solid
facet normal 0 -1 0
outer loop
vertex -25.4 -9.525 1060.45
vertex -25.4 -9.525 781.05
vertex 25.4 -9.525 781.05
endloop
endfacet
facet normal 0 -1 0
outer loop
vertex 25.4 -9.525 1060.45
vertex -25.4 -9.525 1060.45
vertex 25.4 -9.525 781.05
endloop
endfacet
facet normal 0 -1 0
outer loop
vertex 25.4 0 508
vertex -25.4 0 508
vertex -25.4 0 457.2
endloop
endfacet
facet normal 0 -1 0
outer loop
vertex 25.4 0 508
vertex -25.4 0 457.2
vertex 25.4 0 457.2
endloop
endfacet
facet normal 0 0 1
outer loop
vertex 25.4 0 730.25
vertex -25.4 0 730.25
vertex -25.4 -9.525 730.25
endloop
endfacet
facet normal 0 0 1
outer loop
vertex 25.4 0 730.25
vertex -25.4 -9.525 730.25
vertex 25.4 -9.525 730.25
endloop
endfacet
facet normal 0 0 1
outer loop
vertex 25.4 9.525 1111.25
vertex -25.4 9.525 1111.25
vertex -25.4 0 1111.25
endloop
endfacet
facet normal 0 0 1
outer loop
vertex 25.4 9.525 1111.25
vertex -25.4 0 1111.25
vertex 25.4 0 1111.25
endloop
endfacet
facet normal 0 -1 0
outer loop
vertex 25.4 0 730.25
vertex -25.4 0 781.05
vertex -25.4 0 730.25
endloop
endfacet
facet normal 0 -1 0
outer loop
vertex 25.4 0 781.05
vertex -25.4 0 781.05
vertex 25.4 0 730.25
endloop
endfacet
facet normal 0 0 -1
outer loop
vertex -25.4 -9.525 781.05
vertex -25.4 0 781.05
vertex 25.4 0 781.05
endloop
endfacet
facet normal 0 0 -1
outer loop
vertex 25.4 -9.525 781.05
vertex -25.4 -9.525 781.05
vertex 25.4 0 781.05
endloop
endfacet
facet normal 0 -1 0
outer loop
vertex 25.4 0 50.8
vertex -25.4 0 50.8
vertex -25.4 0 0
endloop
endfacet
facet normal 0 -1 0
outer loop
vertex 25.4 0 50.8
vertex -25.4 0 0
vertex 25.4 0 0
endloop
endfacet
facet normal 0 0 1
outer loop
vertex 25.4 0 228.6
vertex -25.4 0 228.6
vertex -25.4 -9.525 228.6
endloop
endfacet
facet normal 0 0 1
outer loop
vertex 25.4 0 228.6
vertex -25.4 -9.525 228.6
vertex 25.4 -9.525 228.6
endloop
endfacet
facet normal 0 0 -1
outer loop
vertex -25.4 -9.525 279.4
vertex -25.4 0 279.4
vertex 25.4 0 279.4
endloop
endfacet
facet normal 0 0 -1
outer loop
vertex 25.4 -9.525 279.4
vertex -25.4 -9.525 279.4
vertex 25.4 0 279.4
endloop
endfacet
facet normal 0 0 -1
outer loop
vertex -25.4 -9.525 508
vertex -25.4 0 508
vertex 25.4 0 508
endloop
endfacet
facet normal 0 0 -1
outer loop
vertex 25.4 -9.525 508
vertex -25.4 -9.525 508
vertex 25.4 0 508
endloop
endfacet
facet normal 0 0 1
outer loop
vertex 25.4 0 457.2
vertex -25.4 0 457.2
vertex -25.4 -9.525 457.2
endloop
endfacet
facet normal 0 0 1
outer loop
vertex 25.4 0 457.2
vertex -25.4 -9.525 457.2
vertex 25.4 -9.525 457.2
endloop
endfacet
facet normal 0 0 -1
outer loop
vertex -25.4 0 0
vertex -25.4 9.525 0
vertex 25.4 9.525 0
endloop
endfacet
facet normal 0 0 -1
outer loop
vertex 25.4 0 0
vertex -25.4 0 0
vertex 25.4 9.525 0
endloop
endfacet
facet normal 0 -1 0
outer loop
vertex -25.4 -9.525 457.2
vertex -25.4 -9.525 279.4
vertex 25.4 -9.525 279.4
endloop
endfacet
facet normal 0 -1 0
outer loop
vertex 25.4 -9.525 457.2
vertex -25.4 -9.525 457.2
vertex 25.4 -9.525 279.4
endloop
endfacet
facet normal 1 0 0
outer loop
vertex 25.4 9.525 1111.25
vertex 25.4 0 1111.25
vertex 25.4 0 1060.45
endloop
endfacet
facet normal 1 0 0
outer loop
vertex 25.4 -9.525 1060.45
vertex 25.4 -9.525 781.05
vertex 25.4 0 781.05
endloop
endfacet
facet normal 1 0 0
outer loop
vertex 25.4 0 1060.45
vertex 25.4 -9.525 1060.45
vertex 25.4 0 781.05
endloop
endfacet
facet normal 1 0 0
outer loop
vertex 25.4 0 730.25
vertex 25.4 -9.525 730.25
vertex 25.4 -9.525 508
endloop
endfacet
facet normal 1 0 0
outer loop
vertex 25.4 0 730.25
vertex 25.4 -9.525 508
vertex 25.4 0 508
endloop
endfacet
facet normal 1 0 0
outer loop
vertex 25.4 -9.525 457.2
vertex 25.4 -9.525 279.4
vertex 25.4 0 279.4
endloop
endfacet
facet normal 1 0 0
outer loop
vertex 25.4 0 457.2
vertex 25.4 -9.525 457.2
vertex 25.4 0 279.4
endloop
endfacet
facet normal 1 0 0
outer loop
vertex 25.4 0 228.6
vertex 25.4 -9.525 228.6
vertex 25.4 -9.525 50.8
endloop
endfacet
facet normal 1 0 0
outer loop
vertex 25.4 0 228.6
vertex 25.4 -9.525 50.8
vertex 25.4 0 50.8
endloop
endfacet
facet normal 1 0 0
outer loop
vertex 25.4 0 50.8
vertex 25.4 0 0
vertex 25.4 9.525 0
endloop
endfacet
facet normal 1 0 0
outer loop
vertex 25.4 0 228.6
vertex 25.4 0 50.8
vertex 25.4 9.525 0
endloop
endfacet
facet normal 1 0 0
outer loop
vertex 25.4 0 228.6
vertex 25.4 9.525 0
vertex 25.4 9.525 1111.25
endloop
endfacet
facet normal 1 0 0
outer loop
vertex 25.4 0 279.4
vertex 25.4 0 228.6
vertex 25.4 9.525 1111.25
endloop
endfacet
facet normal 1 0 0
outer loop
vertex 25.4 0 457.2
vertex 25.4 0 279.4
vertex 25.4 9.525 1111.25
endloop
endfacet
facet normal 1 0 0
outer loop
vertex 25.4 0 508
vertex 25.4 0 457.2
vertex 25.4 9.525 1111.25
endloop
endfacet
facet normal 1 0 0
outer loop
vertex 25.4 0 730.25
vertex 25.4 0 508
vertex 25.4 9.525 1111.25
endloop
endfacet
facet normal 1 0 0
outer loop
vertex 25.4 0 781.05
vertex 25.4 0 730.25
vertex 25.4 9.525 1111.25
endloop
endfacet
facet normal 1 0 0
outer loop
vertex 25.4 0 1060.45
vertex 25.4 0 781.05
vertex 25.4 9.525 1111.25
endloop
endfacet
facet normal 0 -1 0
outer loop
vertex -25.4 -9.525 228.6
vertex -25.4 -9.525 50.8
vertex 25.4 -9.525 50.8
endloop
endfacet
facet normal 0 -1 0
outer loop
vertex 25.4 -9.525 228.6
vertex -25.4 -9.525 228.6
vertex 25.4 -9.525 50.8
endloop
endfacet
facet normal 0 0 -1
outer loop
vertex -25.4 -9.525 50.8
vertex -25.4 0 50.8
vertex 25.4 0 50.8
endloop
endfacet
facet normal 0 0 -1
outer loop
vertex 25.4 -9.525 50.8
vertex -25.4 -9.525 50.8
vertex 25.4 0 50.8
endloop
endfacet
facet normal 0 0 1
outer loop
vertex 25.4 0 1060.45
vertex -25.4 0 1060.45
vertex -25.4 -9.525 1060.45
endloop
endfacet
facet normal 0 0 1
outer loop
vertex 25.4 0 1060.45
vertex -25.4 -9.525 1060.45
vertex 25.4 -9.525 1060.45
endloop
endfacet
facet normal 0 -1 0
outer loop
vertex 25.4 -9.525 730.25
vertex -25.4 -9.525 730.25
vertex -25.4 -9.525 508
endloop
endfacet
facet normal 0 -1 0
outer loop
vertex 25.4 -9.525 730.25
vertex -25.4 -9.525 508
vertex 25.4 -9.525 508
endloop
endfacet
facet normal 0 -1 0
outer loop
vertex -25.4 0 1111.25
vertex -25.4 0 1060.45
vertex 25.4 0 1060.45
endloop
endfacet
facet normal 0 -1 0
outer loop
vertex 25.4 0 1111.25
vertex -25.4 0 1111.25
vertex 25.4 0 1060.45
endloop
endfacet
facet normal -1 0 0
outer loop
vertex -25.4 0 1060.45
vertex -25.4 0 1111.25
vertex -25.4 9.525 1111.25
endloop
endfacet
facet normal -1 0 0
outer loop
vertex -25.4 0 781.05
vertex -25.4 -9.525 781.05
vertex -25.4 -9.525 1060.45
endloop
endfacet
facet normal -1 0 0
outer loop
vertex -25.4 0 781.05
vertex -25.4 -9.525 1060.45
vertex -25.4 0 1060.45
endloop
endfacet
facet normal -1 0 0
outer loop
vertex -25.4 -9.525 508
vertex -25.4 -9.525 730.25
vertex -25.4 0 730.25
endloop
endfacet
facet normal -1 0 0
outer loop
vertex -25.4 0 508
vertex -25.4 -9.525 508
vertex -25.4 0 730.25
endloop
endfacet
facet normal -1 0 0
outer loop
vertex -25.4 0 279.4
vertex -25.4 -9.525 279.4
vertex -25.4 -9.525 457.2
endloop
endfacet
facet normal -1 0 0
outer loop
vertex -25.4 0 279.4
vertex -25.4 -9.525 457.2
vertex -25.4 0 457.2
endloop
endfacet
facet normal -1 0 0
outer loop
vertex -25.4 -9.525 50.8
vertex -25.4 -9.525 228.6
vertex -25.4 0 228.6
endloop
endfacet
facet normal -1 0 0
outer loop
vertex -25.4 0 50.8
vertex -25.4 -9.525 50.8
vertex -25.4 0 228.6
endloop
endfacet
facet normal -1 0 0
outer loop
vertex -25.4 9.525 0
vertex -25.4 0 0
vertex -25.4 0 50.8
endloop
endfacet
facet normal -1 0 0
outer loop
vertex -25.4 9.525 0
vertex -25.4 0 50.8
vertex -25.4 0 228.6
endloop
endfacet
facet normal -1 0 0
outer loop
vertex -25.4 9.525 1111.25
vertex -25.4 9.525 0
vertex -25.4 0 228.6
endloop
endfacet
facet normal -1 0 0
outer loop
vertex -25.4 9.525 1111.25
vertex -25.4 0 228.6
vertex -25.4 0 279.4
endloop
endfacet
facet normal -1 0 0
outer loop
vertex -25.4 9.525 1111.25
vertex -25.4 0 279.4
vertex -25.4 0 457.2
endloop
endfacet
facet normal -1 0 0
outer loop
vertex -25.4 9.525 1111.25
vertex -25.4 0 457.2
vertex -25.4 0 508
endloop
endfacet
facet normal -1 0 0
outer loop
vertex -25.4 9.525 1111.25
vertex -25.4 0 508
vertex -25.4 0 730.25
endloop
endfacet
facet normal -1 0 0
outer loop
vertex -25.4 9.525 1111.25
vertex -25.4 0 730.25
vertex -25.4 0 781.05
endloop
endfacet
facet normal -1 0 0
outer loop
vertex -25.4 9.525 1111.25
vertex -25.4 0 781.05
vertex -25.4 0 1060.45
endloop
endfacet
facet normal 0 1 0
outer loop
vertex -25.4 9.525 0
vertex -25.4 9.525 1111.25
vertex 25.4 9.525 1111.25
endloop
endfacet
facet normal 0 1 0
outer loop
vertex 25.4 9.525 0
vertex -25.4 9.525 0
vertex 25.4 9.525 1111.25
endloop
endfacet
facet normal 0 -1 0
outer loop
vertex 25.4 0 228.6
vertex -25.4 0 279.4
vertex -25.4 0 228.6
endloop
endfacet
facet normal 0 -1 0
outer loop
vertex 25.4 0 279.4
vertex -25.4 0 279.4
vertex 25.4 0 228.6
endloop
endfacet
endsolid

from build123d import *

# Parameters (mm, degrees)
F0_W     = 50.8
F0_H     = 19.05
F1_DEPTH = 1111.25
F2_W     = 122.435573
F2_H     = 50.8
F2_W_2   = 93.867282
F2_W_3   = 343.160421
F2_W_4   = 175.76392
F2_W_5   = 161.28926
F3_DEPTH = 25.4
F4_R     = 4.7625
F5_DEPTH = 25.4


with BuildPart() as f1:
    # F0 (on Top) → F1 (new body)
    with BuildSketch(Plane.XY):
        Rectangle(F0_W, F0_H)
    extrude(amount=F1_DEPTH)

    # F2 (on Front) → F3 (cut)
    with BuildSketch(Plane.XZ):
        with Locations((22.446524, 25.4)):
            Rectangle(F2_W, F2_H)
        with Locations((2.720783, 755.65)):
            Rectangle(F2_W_2, F2_H)
        with Locations((-38.781822, 1085.85)):
            Rectangle(F2_W_3, F2_H)
        with Locations((-28.949343, 254)):
            Rectangle(F2_W_4, F2_H)
        with Locations((-29.98326, 482.6)):
            Rectangle(F2_W_5, F2_H)
    extrude(amount=F3_DEPTH, mode=Mode.SUBTRACT)

    # F4 (on Front) → F5 (cut)
    with BuildSketch(Plane.XZ):
        with Locations((15.875, 254)):
            Circle(F4_R)
        with Locations((15.875, 482.6)):
            Circle(F4_R)
    extrude(amount=F5_DEPTH, mode=Mode.SUBTRACT)


solid = f1.part
